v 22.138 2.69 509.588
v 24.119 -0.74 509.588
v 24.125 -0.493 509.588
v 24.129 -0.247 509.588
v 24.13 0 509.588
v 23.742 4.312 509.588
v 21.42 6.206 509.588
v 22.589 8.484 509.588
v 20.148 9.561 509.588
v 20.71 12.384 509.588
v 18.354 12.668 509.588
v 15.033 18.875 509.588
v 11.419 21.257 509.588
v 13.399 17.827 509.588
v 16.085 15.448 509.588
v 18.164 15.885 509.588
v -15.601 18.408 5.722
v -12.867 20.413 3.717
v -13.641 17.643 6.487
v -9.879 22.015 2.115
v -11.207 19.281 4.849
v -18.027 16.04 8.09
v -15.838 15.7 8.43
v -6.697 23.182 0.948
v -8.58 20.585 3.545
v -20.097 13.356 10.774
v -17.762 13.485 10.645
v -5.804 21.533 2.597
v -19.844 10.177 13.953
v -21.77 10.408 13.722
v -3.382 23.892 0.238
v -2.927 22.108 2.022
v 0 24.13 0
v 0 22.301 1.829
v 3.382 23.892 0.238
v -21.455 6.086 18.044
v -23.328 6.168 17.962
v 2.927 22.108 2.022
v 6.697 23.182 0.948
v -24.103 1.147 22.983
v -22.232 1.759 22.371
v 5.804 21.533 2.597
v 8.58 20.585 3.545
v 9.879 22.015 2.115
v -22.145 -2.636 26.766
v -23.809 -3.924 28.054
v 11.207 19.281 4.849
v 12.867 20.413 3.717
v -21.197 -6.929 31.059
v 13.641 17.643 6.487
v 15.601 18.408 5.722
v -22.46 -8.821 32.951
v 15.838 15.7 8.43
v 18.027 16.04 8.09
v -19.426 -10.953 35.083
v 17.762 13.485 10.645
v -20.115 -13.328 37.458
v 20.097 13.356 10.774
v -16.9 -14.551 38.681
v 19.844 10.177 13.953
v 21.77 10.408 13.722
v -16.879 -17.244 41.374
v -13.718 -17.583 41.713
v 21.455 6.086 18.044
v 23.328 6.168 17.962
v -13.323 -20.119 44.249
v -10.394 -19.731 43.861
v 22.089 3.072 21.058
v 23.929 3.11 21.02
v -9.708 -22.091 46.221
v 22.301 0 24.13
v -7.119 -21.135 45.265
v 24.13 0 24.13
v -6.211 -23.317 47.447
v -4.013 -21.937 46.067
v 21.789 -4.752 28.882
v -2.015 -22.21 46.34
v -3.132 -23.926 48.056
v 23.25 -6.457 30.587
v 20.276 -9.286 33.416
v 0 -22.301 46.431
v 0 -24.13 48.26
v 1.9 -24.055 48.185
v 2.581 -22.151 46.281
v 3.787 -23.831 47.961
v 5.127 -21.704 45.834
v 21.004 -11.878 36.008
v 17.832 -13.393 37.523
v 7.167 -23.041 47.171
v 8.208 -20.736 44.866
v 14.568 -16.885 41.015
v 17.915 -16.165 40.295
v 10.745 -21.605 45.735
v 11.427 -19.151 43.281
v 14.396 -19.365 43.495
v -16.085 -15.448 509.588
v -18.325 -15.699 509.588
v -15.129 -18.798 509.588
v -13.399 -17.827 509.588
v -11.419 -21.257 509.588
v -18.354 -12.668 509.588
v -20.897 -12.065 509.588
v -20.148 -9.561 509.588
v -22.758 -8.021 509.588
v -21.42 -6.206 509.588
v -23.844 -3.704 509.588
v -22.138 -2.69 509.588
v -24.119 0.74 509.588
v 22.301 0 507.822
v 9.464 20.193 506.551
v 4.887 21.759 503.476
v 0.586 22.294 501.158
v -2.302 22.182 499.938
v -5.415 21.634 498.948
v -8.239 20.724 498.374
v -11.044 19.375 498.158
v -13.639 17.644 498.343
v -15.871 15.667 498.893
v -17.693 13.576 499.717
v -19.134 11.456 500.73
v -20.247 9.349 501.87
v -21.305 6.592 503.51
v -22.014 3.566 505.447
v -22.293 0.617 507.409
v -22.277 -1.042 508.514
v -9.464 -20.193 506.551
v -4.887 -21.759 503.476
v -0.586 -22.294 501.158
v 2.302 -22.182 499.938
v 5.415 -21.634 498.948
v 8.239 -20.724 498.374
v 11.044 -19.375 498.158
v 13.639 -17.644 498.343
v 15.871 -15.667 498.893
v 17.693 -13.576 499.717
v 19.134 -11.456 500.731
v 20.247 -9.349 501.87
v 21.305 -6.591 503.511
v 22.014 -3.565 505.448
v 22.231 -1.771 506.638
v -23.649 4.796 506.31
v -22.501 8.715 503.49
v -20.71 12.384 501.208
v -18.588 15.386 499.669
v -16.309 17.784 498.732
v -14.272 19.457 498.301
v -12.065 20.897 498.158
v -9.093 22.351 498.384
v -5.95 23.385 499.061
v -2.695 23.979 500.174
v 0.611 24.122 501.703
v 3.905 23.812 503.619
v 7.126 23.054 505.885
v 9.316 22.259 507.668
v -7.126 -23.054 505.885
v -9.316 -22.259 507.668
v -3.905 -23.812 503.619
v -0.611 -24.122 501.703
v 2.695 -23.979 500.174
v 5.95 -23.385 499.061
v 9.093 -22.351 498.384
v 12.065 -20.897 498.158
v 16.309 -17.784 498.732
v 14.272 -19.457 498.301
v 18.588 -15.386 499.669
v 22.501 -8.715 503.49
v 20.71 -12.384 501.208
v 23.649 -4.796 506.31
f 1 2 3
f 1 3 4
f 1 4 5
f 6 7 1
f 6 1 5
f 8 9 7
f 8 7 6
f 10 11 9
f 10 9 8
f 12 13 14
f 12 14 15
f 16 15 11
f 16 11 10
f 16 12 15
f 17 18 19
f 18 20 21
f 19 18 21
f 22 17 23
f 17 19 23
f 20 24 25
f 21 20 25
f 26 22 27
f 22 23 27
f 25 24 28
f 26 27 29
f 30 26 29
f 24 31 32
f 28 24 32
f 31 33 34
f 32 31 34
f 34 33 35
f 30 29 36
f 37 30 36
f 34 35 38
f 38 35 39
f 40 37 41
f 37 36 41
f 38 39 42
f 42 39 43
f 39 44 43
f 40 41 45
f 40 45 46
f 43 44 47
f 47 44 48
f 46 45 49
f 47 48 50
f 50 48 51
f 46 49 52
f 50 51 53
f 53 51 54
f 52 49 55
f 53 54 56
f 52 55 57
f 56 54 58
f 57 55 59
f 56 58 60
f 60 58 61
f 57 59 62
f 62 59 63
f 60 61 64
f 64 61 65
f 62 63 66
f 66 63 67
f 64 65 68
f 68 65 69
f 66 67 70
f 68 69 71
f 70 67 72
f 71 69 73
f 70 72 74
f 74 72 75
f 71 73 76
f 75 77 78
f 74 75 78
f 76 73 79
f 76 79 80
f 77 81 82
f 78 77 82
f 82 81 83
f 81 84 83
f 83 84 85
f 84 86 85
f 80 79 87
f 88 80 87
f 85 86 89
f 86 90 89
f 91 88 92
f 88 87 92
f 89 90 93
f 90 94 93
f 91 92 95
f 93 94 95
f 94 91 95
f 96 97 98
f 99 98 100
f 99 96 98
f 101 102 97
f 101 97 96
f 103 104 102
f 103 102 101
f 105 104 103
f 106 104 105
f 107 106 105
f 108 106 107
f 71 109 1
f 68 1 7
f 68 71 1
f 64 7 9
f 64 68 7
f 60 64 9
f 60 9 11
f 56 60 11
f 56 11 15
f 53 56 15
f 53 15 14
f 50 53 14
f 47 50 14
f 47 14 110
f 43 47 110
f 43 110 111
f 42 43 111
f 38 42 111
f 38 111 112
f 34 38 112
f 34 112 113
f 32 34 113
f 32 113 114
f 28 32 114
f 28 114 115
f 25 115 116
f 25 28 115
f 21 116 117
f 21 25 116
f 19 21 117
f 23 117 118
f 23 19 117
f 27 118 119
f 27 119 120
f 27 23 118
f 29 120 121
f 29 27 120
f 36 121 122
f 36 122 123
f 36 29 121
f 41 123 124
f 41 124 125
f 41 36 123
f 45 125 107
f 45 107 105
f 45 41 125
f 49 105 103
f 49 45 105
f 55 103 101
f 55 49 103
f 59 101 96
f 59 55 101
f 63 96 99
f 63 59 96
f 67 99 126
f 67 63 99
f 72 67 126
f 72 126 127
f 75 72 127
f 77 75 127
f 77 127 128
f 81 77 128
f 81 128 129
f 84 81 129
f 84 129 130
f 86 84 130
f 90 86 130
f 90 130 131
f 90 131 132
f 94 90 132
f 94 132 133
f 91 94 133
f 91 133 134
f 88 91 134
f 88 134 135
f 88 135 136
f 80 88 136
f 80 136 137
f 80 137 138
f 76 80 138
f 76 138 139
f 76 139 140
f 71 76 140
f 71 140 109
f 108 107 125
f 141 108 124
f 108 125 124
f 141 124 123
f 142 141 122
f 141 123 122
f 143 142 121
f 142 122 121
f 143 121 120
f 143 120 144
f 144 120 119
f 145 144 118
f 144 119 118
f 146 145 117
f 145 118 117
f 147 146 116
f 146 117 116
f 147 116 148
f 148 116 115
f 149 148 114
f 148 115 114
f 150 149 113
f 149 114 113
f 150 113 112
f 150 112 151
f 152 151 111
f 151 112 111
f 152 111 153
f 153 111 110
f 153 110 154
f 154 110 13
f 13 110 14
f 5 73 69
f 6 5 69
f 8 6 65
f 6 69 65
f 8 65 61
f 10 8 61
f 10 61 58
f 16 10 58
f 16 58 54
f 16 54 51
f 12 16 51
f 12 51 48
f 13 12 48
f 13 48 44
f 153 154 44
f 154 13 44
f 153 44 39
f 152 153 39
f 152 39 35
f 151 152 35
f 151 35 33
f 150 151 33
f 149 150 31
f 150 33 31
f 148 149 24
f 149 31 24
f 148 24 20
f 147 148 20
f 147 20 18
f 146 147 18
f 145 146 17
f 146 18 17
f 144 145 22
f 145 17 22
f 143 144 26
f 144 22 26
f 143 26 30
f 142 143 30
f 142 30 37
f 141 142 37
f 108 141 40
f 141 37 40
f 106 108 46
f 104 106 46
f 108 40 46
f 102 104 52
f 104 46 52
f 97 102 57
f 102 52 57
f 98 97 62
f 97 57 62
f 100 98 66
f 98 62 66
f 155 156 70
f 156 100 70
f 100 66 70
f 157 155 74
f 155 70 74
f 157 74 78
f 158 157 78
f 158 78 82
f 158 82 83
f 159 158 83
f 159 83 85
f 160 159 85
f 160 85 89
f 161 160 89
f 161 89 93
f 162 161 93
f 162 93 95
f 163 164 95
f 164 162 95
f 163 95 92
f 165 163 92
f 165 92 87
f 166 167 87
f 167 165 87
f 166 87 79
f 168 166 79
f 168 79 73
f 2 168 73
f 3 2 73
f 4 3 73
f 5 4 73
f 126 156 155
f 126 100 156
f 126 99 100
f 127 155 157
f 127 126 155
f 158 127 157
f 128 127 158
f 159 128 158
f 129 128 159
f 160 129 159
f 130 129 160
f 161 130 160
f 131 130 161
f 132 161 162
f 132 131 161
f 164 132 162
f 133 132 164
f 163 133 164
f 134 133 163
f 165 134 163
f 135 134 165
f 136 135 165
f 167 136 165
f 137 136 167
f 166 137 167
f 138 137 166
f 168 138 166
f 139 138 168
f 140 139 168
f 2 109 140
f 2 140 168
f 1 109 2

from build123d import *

# Parameters (mm, degrees)
F0_R          = 24.13
F0_R_2        = 22.3012
F1_DEPTH      = 509.5875
F3_DEPTH      = 24.131
F3_DEPTH_BACK = 24.131
F6_R          = 24.13
F7_DEPTH      = 50.8
F7_DEPTH_BACK = 50.8


with BuildPart() as f1:
    # F0 (on Top) → F1 (new body)
    with BuildSketch(Plane.XY):
        Circle(F0_R)
        Circle(F0_R_2, mode=Mode.SUBTRACT)
    extrude(amount=F1_DEPTH)

    # F2 (on Right) → F3 (cut, two sides)
    with BuildSketch(Plane.YZ) as f3_sk:
        Polygon((-24.13, 48.26), (-24.13, 0), (24.13, 0), align=None)
    extrude(amount=-F3_DEPTH, mode=Mode.SUBTRACT)
    extrude(f3_sk.sketch, amount=F3_DEPTH_BACK, mode=Mode.SUBTRACT)

    # F6 (on line) → F7 (cut, two sides)
    with BuildSketch(Plane(origin=(0, 0, 0), x_dir=(0.8660254038, 0.5, 0), z_dir=(0.5, -0.8660254038, 0))) as f7_sk:
        with Locations((0, 522.2875)):
            Circle(F6_R)
    extrude(amount=-F7_DEPTH, mode=Mode.SUBTRACT)
    extrude(f7_sk.sketch, amount=F7_DEPTH_BACK, mode=Mode.SUBTRACT)


solid = f1.part
